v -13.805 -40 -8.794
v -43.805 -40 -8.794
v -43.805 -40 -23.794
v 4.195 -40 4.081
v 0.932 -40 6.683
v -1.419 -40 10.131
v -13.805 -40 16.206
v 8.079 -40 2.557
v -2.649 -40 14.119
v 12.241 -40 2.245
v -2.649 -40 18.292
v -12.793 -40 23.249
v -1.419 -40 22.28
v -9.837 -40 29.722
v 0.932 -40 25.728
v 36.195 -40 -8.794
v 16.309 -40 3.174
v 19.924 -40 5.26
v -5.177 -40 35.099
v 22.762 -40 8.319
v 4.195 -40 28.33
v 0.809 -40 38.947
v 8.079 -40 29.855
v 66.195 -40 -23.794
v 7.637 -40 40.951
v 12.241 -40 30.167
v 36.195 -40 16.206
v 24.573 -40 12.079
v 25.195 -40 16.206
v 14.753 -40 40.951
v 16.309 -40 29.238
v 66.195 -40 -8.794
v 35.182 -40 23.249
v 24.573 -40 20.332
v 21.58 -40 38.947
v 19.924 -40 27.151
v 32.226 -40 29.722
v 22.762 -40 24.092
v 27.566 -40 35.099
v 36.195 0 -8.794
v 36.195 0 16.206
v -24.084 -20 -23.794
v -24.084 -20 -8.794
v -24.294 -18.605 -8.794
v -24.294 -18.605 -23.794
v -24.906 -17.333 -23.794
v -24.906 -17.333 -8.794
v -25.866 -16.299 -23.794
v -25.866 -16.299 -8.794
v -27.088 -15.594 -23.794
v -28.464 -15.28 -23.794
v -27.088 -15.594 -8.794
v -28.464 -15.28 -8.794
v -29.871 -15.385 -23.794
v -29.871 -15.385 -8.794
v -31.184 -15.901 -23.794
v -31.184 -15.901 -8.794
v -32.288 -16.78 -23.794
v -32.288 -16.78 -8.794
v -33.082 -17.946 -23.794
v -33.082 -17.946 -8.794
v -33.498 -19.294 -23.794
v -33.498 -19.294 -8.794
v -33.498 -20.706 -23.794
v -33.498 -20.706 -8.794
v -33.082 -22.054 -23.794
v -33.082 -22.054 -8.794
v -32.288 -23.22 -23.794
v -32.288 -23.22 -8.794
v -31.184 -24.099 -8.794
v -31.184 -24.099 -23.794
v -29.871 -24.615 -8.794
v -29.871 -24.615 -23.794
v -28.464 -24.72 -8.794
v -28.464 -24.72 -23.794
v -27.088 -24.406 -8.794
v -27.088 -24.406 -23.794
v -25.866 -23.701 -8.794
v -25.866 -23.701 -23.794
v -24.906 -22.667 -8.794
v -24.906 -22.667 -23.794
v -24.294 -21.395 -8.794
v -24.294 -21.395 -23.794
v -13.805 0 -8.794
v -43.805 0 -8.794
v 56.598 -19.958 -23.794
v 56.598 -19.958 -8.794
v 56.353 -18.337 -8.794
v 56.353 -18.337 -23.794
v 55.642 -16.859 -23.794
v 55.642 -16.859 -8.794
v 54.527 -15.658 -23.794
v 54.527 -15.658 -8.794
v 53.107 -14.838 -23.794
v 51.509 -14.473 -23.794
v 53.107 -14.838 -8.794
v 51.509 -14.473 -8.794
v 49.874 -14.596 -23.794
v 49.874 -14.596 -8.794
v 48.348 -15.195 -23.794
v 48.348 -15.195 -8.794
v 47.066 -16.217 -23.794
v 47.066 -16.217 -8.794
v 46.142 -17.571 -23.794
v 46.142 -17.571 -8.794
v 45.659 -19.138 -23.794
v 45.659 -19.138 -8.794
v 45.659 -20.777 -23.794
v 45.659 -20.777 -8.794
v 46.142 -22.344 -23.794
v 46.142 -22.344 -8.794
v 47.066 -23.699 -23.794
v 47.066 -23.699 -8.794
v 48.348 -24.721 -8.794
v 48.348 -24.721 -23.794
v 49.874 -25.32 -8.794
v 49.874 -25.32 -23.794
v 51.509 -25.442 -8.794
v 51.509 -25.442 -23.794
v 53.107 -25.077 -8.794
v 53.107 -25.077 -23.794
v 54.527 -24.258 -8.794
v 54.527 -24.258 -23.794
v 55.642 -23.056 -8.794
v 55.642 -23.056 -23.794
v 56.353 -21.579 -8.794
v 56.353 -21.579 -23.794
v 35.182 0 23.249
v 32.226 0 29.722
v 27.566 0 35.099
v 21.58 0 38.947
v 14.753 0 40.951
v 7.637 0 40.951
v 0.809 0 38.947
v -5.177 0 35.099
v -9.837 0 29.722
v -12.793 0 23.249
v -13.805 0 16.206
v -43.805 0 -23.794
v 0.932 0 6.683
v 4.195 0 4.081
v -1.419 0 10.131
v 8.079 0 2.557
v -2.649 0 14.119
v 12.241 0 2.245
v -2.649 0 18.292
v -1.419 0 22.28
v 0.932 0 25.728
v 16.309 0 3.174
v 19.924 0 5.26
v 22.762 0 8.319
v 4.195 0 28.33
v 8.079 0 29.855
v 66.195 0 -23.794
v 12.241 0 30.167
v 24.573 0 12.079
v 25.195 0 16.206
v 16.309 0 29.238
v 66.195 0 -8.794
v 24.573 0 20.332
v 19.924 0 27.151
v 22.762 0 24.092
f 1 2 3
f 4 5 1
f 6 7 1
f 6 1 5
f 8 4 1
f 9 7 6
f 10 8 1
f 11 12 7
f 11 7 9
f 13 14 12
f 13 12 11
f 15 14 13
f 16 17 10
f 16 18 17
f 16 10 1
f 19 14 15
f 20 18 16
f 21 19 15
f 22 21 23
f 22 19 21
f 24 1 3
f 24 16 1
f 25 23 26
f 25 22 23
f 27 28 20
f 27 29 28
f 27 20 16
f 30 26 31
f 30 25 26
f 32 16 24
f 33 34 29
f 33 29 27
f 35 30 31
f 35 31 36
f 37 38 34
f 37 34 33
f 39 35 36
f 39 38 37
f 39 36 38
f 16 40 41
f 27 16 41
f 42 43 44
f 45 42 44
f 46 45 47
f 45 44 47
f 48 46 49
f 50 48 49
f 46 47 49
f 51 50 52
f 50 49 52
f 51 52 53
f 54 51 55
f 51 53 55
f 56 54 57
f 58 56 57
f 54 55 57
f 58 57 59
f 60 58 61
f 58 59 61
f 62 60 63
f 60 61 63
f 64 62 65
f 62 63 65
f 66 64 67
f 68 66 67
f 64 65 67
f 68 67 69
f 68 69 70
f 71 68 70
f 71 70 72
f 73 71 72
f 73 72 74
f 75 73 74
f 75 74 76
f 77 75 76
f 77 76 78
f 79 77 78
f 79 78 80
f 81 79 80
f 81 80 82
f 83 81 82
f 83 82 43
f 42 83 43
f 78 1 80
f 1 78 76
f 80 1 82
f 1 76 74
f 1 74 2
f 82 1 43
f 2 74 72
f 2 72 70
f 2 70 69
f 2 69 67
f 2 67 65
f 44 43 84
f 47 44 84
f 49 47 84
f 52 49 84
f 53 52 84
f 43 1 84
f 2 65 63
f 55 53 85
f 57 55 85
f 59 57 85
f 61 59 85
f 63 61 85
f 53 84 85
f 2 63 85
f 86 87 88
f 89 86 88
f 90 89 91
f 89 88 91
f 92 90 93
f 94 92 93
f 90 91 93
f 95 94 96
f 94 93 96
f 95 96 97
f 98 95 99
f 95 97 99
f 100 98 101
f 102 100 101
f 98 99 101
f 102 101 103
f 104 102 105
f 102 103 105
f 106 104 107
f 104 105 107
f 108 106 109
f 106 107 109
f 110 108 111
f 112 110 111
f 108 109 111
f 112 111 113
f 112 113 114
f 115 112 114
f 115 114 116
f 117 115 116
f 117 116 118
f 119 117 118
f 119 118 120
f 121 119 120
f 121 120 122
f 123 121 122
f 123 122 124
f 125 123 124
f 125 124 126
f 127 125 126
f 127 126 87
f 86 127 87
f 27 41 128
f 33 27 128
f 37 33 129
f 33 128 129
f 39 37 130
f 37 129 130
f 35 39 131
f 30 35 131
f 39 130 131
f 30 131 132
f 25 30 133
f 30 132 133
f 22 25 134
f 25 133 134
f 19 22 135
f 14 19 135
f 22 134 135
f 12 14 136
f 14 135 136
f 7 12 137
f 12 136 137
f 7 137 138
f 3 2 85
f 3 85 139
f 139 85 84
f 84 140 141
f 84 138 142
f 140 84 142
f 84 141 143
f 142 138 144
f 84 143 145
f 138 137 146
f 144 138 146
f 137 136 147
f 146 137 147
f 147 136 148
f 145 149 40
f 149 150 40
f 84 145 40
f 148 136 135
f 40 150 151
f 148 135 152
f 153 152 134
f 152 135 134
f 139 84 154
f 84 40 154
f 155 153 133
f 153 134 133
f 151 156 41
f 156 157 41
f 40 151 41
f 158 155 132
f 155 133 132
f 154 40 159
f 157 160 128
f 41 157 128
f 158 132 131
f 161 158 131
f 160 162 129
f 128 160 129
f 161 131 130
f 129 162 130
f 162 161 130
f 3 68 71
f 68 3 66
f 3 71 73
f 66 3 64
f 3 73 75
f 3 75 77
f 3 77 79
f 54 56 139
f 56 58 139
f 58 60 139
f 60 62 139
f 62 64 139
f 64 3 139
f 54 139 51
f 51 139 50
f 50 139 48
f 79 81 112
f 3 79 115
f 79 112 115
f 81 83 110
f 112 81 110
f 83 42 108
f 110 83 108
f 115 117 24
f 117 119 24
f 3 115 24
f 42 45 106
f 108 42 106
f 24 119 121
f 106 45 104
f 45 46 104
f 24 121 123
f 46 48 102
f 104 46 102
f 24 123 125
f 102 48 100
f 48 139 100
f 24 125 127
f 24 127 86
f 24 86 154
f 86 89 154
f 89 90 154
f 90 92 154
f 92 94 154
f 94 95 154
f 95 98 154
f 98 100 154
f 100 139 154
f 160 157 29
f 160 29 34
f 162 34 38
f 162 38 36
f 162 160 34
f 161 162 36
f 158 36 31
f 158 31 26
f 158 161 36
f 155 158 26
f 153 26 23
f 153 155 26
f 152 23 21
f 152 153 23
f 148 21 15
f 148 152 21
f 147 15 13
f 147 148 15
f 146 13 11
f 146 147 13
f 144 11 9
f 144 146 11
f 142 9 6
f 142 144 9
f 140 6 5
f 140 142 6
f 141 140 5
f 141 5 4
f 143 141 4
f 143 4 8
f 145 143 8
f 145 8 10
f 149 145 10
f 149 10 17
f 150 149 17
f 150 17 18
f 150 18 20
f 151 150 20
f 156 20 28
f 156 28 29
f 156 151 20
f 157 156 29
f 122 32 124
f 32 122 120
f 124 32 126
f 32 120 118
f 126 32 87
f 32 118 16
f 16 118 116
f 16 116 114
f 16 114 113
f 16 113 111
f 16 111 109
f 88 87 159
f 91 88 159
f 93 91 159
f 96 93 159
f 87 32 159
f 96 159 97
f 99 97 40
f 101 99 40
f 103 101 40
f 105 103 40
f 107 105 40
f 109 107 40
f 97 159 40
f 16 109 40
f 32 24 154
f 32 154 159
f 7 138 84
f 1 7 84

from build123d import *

# Parameters (mm, degrees)
F0_R     = 14
F1_DEPTH = 40
F2_R     = 4.733674
F2_R_2   = 5.5
F3_DEPTH = 25


with BuildPart() as f1:
    # F0 (on Front) → F1 (new body)
    with BuildSketch(Plane.XZ):
        with BuildLine():
            Line((-43.805312, -8.794249), (-43.805312, -23.794249))
            Line((-43.805312, -23.794249), (66.194688, -23.794249))
            Line((66.194688, -23.794249), (66.194688, -8.794249))
            Line((66.194688, -8.794249), (36.194688, -8.794249))
            Line((36.194688, -8.794249), (36.194688, 16.205751))
            ThreePointArc((36.194688, 16.205751), (11.194688, 41.205751), (-13.805312, 16.205751))
            Line((-13.805312, 16.205751), (-13.805312, -8.794249))
            Line((-13.805312, -8.794249), (-43.805312, -8.794249))
        make_face()
        with Locations((11.194688, 16.205751)):
            Circle(F0_R, mode=Mode.SUBTRACT)
    extrude(amount=F1_DEPTH)

    # F2 (on Top) → F3 (cut)
    with BuildSketch(Plane.XY):
        with Locations((-28.817502, -20)):
            Circle(F2_R)
        with Locations((51.097777, -19.957691)):
            Circle(F2_R_2)
    extrude(amount=-F3_DEPTH, mode=Mode.SUBTRACT)


solid = f1.part
